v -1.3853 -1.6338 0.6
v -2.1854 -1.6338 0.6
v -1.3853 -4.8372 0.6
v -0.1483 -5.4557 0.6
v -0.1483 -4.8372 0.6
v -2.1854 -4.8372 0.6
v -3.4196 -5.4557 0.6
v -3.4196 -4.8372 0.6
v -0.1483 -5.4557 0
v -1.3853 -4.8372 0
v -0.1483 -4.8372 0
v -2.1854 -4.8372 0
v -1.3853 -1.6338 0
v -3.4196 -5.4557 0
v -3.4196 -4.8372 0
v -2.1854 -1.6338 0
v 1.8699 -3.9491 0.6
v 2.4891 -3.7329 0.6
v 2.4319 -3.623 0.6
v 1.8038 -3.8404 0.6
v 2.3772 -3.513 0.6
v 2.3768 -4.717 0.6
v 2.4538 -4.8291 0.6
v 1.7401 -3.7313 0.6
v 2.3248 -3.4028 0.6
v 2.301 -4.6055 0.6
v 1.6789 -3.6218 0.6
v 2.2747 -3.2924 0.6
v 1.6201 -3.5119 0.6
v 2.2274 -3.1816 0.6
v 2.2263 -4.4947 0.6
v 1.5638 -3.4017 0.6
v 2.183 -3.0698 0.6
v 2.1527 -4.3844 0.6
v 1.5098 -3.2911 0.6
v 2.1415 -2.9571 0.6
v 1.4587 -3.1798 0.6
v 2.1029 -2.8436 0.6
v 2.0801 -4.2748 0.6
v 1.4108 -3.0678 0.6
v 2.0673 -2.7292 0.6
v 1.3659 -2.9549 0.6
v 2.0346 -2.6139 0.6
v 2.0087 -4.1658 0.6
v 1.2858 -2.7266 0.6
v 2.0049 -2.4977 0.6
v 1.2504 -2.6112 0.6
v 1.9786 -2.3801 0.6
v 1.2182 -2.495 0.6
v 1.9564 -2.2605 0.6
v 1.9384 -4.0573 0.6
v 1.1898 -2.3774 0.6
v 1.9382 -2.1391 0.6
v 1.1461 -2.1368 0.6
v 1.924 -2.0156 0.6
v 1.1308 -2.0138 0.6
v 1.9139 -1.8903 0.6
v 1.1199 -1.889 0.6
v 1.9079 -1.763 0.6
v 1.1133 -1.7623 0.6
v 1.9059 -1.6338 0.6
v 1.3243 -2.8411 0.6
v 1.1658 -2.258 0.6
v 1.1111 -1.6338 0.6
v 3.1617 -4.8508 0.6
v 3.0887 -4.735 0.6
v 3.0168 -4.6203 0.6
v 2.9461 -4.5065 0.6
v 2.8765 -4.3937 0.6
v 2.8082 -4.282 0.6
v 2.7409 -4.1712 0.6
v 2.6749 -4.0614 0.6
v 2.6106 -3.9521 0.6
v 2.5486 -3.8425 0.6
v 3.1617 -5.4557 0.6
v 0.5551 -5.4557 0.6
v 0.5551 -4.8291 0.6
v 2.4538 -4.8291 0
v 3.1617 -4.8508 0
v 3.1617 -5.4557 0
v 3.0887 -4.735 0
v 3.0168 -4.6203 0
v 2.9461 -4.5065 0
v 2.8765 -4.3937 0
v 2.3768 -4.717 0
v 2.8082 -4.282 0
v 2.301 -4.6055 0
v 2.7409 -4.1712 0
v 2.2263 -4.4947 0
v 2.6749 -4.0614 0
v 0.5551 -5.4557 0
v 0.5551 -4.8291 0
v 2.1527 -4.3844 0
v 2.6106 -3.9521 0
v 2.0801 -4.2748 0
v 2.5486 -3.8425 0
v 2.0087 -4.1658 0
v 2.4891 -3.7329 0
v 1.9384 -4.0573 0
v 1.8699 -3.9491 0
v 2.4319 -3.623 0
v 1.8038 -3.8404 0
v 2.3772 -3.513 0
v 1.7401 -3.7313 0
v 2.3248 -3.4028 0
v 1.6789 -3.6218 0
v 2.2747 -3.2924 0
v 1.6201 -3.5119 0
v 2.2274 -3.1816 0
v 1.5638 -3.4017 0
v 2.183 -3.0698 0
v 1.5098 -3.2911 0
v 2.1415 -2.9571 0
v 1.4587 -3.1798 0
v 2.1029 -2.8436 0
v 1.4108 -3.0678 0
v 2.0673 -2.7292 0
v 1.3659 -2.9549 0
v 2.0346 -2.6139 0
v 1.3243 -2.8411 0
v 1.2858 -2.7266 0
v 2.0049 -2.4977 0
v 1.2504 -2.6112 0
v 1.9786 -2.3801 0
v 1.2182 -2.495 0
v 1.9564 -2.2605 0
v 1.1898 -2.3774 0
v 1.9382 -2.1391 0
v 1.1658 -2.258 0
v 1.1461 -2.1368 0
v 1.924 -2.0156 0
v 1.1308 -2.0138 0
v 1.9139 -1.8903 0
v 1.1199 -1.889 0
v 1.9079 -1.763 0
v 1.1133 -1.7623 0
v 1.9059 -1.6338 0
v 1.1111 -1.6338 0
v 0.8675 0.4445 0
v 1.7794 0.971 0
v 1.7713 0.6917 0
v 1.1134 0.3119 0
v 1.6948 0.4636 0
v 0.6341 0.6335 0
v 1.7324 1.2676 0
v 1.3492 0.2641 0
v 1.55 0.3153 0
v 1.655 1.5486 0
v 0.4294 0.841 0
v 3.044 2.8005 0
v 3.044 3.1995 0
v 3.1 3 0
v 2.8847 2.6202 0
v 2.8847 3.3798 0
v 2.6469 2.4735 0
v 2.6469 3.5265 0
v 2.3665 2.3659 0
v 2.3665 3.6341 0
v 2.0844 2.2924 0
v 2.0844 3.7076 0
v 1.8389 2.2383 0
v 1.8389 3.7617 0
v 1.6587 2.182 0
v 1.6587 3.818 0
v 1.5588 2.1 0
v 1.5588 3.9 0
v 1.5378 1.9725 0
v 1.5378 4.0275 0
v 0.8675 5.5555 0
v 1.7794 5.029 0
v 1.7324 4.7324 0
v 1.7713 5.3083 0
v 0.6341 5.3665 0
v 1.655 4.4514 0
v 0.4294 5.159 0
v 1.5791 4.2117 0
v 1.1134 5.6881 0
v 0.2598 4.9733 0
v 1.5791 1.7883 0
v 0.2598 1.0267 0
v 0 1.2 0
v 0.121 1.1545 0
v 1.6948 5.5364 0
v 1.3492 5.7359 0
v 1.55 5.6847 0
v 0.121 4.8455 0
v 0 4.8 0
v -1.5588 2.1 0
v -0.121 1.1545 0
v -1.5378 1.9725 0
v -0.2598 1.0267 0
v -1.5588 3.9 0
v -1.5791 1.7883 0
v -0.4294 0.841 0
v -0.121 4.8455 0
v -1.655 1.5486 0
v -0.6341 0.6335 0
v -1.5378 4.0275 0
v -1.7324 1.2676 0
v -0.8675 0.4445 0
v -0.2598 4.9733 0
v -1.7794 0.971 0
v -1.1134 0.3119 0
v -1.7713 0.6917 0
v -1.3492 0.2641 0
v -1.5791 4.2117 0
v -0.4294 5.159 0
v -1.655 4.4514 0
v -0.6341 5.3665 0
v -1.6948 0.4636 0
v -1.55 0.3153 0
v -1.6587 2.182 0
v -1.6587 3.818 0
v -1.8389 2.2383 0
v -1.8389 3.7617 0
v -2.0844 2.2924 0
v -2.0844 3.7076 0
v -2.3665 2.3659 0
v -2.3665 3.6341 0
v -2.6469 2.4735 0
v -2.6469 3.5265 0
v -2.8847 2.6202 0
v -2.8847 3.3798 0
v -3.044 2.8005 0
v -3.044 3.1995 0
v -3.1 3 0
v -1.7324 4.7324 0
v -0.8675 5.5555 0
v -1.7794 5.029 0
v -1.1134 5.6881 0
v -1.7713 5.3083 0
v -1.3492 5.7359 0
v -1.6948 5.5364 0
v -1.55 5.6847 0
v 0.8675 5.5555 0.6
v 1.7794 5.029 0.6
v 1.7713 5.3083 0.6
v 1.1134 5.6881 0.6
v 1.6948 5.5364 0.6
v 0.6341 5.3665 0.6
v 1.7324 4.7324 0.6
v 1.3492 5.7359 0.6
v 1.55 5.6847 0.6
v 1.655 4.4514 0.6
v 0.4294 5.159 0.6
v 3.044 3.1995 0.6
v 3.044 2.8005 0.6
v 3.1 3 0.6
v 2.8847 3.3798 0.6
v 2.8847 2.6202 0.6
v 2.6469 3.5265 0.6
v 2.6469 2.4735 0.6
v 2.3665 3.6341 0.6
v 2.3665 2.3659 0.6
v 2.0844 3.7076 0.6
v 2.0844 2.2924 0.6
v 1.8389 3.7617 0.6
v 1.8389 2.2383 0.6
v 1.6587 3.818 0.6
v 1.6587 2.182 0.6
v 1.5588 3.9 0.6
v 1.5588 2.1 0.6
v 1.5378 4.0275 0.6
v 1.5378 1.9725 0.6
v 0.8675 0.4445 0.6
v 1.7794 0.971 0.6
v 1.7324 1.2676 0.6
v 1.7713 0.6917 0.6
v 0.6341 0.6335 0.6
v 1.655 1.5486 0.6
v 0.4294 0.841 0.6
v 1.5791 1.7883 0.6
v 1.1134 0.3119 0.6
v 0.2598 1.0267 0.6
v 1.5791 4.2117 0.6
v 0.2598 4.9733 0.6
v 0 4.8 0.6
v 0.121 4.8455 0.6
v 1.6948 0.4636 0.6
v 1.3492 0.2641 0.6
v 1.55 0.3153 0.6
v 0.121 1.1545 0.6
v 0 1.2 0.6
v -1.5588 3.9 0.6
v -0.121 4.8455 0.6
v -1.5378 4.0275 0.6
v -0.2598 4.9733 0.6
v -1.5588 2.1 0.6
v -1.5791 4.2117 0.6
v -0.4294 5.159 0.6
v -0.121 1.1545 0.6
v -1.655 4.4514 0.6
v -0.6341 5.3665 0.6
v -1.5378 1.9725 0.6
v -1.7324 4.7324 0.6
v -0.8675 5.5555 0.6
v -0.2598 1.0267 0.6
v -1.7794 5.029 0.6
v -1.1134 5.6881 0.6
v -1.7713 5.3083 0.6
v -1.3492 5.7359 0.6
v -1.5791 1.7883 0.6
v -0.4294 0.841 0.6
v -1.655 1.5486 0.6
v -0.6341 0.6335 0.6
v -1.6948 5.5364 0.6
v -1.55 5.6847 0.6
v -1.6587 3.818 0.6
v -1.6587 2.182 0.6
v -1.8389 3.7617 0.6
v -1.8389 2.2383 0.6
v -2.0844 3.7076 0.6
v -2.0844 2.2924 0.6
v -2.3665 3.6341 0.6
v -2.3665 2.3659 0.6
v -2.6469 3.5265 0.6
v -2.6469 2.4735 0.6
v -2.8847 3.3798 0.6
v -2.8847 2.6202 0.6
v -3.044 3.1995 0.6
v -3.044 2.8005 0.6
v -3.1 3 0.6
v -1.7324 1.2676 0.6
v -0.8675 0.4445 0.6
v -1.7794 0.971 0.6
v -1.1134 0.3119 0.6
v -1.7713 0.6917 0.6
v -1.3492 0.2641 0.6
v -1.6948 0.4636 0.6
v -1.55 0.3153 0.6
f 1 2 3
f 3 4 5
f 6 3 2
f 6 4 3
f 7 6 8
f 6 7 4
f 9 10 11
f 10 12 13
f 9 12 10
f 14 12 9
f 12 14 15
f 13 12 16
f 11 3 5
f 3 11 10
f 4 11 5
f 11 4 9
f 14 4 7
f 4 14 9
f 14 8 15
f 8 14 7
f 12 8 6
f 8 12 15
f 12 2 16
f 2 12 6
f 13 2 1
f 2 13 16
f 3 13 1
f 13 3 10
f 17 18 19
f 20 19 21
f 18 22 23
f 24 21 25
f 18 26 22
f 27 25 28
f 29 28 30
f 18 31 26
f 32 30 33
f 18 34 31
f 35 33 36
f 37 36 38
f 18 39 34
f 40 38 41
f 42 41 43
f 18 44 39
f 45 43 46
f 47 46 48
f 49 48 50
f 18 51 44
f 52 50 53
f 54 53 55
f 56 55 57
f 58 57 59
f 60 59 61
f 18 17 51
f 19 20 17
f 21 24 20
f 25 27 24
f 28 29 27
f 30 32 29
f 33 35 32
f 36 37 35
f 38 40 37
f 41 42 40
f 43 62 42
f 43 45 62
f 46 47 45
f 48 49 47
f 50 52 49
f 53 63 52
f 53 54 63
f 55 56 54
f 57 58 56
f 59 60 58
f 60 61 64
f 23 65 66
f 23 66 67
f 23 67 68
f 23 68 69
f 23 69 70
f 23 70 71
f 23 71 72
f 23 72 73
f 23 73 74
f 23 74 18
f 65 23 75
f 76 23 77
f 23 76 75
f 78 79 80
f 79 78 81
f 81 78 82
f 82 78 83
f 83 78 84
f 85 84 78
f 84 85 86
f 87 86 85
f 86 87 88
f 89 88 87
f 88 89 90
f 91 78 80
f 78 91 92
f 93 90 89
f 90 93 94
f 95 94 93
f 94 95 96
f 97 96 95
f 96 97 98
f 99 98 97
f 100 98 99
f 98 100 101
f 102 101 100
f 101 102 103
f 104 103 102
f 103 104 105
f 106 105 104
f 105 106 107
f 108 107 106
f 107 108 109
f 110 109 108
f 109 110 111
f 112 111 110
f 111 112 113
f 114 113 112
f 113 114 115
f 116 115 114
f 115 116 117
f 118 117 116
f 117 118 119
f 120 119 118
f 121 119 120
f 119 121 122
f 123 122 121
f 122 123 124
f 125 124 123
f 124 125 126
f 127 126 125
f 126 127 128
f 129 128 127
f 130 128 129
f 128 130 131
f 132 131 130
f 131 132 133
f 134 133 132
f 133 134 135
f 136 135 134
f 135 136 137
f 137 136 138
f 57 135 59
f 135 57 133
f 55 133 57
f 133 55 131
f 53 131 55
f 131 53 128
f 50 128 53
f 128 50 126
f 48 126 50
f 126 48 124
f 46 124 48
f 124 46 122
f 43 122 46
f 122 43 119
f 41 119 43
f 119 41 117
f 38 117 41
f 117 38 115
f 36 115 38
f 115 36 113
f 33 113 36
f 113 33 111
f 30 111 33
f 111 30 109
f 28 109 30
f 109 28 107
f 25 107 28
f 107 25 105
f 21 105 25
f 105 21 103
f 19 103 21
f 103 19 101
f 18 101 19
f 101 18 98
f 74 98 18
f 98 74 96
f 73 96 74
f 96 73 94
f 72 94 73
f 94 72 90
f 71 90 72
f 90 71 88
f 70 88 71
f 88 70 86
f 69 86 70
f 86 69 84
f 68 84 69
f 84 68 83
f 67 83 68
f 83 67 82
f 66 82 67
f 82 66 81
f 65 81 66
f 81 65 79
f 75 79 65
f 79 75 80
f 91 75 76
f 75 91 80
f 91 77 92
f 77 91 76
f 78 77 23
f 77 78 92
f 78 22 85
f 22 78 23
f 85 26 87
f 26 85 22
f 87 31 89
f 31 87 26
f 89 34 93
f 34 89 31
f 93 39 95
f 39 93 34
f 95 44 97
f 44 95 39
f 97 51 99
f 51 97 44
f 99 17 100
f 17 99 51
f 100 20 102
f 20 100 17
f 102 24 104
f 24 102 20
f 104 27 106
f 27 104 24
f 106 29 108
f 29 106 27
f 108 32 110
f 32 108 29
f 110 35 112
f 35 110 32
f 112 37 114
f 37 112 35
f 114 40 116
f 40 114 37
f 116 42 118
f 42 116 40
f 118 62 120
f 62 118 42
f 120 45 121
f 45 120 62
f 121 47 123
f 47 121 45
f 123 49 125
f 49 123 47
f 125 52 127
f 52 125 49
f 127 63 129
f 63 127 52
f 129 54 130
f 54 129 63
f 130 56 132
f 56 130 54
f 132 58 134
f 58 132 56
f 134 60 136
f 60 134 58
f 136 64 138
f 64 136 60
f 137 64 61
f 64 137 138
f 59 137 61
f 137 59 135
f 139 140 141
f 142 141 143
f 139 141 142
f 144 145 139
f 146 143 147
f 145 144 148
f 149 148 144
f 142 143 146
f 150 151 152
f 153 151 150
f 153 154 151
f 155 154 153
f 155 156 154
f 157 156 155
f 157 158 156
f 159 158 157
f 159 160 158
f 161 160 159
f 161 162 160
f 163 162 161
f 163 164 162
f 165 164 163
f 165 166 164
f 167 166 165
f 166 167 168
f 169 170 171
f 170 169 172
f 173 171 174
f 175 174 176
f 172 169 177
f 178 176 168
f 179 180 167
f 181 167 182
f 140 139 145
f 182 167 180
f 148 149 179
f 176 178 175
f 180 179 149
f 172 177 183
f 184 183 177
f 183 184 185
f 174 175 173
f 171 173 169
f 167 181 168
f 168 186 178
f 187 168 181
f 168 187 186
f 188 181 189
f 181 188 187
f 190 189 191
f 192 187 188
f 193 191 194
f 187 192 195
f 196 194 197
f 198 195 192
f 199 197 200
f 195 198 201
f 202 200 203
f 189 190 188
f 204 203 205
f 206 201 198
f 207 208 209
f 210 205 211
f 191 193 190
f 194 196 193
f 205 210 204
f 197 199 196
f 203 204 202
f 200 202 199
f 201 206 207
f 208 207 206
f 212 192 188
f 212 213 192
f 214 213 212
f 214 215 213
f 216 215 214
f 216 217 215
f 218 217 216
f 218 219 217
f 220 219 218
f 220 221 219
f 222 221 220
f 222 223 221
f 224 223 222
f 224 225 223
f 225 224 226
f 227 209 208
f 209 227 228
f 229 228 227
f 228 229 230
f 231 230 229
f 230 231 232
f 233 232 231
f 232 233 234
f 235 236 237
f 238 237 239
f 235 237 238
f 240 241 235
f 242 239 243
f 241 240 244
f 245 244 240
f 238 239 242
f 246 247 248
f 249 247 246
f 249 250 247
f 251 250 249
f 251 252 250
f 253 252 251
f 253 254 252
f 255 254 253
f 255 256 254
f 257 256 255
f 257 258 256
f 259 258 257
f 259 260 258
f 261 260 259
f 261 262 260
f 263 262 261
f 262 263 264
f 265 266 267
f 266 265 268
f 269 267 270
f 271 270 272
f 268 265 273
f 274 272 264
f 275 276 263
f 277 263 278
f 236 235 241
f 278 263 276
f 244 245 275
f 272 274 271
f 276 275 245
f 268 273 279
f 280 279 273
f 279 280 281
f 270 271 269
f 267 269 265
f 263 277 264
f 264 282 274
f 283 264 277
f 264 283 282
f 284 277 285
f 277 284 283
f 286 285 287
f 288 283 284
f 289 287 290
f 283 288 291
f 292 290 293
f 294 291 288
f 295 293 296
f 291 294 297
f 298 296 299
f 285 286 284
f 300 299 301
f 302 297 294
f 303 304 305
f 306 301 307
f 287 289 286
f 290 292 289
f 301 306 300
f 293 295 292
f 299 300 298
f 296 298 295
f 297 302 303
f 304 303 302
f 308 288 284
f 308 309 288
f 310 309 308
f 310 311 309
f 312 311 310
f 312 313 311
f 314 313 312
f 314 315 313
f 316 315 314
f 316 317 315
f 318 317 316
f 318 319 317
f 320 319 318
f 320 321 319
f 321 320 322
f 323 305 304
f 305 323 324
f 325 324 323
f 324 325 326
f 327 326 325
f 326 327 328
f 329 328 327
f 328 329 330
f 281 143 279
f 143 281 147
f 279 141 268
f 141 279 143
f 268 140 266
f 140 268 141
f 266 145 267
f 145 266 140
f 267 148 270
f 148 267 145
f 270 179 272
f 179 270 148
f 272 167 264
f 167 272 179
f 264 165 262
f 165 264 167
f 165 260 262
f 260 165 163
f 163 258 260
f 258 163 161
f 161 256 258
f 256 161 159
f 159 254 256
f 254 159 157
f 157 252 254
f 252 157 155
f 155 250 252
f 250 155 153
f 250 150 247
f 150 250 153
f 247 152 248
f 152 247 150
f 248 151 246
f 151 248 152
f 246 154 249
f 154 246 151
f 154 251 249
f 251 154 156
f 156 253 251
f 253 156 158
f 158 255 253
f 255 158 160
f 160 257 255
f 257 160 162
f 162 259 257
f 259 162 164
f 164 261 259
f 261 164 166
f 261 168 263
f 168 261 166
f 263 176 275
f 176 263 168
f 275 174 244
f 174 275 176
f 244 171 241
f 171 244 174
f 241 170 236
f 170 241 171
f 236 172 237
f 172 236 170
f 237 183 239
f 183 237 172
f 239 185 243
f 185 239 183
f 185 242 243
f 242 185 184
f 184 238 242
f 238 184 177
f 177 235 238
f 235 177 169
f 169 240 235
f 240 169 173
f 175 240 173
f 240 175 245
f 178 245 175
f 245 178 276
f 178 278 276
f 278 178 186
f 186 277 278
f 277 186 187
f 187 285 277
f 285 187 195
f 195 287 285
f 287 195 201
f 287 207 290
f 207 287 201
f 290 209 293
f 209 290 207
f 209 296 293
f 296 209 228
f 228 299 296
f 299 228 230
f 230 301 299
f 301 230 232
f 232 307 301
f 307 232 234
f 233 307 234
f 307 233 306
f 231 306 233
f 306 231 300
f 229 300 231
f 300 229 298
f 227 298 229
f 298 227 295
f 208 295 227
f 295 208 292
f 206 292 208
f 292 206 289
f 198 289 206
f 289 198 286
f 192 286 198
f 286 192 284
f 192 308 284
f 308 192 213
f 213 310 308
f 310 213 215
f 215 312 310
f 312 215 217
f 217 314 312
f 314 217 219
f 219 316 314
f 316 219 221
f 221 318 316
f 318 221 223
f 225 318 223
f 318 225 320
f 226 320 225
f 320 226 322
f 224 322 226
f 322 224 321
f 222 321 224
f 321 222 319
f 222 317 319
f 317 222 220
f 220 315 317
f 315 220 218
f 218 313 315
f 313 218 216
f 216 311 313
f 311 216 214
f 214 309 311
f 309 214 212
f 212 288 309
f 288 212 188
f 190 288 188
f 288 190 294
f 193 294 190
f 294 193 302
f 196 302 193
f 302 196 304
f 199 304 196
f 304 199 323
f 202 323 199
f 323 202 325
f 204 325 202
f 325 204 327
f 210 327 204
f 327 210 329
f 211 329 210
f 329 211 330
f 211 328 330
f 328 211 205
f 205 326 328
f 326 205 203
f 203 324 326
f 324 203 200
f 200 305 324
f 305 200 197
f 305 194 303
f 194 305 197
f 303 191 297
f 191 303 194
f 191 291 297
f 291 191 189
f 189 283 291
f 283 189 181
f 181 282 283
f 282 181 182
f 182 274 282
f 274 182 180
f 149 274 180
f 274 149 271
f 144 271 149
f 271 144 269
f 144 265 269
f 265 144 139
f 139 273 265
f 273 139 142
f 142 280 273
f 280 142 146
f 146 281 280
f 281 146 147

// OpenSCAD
$fn = 50;

difference() {
	union() {
		translate(v = [-1.825, -3.5, 0.6]) {
			rotate(a = [180, 0, 0]) {
				linear_extrude(height = 0.6) {
					text(font = "Liberation Sans:style=Bold", halign = "center", size = 4.0, text = "T", valign = "center");
				}
			}
		}
		translate(v = [1.825, -3.5, 0.6]) {
			rotate(a = [180, 0, 0]) {
				linear_extrude(height = 0.6) {
					text(font = "Liberation Sans:style=Bold", halign = "center", size = 4.0, text = "7", valign = "center");
				}
			}
		}
		translate(v = [0, 3, 0]) {
			linear_extrude(height = 0.6) {
				polygon(points = [[3.1, 0.0], [3.0439902950186117, 0.1995136647114984], [2.8847272103883213, 0.3797815421059436], [2.646888617374527, 0.5264988810722369], [2.3665182744082176, 0.6341066605011758], [2.0844354103556904, 0.7075704773708675], [1.8388718910678303, 0.761685676746956], [1.658746676795018, 0.818003336606089], [1.55884572681199, 0.9], [1.5377850082788151, 1.0275150922444565], [1.5790750912955211, 1.211666933596394], [1.6549917135488983, 1.4513887792304347], [1.7324116139070416, 1.7324116139070416], [1.779405714759903, 2.0290233430980913], [1.7712640685463372, 2.3083562761315313], [1.6947790495515949, 2.5364160920036563], [1.5500000000000005, 2.68467875173176], [1.3492112454670173, 2.735929756715155], [1.1134631418419842, 2.688137818237475], [0.8674829026146248, 2.555522224170328], [0.6341066605011758, 2.3665182744082176], [0.42944369680679173, 2.1589592566013023], [0.2597967997723095, 1.9733526103433505], [0.120961668516203, 1.8455184288505457], [1.102182119232618e-16, 1.8000000000000003], [-0.12096166851620277, 1.8455184288505457], [-0.25979679977230924, 1.9733526103433503], [-0.42944369680679134, 2.158959256601302], [-0.6341066605011755, 2.366518274408217], [-0.8674829026146244, 2.555522224170328], [-1.1134631418419831, 2.688137818237475], [-1.3492112454670169, 2.735929756715155], [-1.5499999999999994, 2.68467875173176], [-1.6947790495515944, 2.536416092003656], [-1.7712640685463372, 2.3083562761315313], [-1.7794057147599032, 2.0290233430980913], [-1.7324116139070418, 1.732411613907042], [-1.6549917135488983, 1.4513887792304352], [-1.5790750912955214, 1.211666933596395], [-1.5377850082788156, 1.0275150922444576], [-1.55884572681199, 0.9], [-1.6587466767950174, 0.8180033366060897], [-1.8388718910678303, 0.7616856767469562], [-2.084435410355689, 0.7075704773708675], [-2.3665182744082154, 0.634106660501176], [-2.646888617374527, 0.5264988810722366], [-2.8847272103883204, 0.37978154210594467], [-3.0439902950186117, 0.1995136647114986], [-3.1, 3.796405077356795e-16], [-3.043990295018612, -0.19951366471149784], [-2.8847272103883213, -0.37978154210594417], [-2.646888617374528, -0.5264988810722362], [-2.366518274408217, -0.6341066605011759], [-2.0844354103556904, -0.7075704773708673], [-1.8388718910678312, -0.7616856767469561], [-1.6587466767950179, -0.8180033366060894], [-1.5588457268119902, -0.8999999999999996], [-1.5377850082788154, -1.0275150922444558], [-1.5790750912955211, -1.211666933596394], [-1.6549917135488978, -1.4513887792304343], [-1.7324116139070413, -1.7324116139070393], [-1.7794057147599032, -2.0290233430980904], [-1.7712640685463374, -2.30835627613153], [-1.6947790495515942, -2.5364160920036567], [-1.5500000000000014, -2.6846787517317594], [-1.349211245467018, -2.7359297567151555], [-1.1134631418419827, -2.688137818237474], [-0.8674829026146252, -2.5555222241703284], [-0.6341066605011755, -2.366518274408217], [-0.42944369680679256, -2.1589592566013027], [-0.2597967997723094, -1.973352610343351], [-0.12096166851620195, -1.8455184288505448], [-3.3065463576978537e-16, -1.8000000000000003], [0.12096166851620122, -1.8455184288505442], [0.2597967997723086, -1.9733526103433503], [0.4294436968067915, -2.1589592566013014], [0.6341066605011743, -2.3665182744082163], [0.8674829026146239, -2.5555222241703275], [1.1134631418419814, -2.688137818237473], [1.3492112454670167, -2.735929756715155], [1.5500000000000005, -2.68467875173176], [1.6947790495515938, -2.536416092003658], [1.7712640685463361, -2.3083562761315344], [1.7794057147599027, -2.0290233430980895], [1.732411613907041, -1.7324116139070416], [1.6549917135488992, -1.451388779230435], [1.5790750912955214, -1.2116669335963952], [1.5377850082788151, -1.0275150922444585], [1.5588457268119893, -0.9000000000000009], [1.658746676795018, -0.8180033366060894], [1.8388718910678303, -0.7616856767469555], [2.084435410355689, -0.7075704773708676], [2.366518274408215, -0.6341066605011774], [2.646888617374524, -0.5264988810722376], [2.8847272103883217, -0.37978154210594395], [3.0439902950186117, -0.1995136647114976]]);
			}
		}
	}
	union();
}
